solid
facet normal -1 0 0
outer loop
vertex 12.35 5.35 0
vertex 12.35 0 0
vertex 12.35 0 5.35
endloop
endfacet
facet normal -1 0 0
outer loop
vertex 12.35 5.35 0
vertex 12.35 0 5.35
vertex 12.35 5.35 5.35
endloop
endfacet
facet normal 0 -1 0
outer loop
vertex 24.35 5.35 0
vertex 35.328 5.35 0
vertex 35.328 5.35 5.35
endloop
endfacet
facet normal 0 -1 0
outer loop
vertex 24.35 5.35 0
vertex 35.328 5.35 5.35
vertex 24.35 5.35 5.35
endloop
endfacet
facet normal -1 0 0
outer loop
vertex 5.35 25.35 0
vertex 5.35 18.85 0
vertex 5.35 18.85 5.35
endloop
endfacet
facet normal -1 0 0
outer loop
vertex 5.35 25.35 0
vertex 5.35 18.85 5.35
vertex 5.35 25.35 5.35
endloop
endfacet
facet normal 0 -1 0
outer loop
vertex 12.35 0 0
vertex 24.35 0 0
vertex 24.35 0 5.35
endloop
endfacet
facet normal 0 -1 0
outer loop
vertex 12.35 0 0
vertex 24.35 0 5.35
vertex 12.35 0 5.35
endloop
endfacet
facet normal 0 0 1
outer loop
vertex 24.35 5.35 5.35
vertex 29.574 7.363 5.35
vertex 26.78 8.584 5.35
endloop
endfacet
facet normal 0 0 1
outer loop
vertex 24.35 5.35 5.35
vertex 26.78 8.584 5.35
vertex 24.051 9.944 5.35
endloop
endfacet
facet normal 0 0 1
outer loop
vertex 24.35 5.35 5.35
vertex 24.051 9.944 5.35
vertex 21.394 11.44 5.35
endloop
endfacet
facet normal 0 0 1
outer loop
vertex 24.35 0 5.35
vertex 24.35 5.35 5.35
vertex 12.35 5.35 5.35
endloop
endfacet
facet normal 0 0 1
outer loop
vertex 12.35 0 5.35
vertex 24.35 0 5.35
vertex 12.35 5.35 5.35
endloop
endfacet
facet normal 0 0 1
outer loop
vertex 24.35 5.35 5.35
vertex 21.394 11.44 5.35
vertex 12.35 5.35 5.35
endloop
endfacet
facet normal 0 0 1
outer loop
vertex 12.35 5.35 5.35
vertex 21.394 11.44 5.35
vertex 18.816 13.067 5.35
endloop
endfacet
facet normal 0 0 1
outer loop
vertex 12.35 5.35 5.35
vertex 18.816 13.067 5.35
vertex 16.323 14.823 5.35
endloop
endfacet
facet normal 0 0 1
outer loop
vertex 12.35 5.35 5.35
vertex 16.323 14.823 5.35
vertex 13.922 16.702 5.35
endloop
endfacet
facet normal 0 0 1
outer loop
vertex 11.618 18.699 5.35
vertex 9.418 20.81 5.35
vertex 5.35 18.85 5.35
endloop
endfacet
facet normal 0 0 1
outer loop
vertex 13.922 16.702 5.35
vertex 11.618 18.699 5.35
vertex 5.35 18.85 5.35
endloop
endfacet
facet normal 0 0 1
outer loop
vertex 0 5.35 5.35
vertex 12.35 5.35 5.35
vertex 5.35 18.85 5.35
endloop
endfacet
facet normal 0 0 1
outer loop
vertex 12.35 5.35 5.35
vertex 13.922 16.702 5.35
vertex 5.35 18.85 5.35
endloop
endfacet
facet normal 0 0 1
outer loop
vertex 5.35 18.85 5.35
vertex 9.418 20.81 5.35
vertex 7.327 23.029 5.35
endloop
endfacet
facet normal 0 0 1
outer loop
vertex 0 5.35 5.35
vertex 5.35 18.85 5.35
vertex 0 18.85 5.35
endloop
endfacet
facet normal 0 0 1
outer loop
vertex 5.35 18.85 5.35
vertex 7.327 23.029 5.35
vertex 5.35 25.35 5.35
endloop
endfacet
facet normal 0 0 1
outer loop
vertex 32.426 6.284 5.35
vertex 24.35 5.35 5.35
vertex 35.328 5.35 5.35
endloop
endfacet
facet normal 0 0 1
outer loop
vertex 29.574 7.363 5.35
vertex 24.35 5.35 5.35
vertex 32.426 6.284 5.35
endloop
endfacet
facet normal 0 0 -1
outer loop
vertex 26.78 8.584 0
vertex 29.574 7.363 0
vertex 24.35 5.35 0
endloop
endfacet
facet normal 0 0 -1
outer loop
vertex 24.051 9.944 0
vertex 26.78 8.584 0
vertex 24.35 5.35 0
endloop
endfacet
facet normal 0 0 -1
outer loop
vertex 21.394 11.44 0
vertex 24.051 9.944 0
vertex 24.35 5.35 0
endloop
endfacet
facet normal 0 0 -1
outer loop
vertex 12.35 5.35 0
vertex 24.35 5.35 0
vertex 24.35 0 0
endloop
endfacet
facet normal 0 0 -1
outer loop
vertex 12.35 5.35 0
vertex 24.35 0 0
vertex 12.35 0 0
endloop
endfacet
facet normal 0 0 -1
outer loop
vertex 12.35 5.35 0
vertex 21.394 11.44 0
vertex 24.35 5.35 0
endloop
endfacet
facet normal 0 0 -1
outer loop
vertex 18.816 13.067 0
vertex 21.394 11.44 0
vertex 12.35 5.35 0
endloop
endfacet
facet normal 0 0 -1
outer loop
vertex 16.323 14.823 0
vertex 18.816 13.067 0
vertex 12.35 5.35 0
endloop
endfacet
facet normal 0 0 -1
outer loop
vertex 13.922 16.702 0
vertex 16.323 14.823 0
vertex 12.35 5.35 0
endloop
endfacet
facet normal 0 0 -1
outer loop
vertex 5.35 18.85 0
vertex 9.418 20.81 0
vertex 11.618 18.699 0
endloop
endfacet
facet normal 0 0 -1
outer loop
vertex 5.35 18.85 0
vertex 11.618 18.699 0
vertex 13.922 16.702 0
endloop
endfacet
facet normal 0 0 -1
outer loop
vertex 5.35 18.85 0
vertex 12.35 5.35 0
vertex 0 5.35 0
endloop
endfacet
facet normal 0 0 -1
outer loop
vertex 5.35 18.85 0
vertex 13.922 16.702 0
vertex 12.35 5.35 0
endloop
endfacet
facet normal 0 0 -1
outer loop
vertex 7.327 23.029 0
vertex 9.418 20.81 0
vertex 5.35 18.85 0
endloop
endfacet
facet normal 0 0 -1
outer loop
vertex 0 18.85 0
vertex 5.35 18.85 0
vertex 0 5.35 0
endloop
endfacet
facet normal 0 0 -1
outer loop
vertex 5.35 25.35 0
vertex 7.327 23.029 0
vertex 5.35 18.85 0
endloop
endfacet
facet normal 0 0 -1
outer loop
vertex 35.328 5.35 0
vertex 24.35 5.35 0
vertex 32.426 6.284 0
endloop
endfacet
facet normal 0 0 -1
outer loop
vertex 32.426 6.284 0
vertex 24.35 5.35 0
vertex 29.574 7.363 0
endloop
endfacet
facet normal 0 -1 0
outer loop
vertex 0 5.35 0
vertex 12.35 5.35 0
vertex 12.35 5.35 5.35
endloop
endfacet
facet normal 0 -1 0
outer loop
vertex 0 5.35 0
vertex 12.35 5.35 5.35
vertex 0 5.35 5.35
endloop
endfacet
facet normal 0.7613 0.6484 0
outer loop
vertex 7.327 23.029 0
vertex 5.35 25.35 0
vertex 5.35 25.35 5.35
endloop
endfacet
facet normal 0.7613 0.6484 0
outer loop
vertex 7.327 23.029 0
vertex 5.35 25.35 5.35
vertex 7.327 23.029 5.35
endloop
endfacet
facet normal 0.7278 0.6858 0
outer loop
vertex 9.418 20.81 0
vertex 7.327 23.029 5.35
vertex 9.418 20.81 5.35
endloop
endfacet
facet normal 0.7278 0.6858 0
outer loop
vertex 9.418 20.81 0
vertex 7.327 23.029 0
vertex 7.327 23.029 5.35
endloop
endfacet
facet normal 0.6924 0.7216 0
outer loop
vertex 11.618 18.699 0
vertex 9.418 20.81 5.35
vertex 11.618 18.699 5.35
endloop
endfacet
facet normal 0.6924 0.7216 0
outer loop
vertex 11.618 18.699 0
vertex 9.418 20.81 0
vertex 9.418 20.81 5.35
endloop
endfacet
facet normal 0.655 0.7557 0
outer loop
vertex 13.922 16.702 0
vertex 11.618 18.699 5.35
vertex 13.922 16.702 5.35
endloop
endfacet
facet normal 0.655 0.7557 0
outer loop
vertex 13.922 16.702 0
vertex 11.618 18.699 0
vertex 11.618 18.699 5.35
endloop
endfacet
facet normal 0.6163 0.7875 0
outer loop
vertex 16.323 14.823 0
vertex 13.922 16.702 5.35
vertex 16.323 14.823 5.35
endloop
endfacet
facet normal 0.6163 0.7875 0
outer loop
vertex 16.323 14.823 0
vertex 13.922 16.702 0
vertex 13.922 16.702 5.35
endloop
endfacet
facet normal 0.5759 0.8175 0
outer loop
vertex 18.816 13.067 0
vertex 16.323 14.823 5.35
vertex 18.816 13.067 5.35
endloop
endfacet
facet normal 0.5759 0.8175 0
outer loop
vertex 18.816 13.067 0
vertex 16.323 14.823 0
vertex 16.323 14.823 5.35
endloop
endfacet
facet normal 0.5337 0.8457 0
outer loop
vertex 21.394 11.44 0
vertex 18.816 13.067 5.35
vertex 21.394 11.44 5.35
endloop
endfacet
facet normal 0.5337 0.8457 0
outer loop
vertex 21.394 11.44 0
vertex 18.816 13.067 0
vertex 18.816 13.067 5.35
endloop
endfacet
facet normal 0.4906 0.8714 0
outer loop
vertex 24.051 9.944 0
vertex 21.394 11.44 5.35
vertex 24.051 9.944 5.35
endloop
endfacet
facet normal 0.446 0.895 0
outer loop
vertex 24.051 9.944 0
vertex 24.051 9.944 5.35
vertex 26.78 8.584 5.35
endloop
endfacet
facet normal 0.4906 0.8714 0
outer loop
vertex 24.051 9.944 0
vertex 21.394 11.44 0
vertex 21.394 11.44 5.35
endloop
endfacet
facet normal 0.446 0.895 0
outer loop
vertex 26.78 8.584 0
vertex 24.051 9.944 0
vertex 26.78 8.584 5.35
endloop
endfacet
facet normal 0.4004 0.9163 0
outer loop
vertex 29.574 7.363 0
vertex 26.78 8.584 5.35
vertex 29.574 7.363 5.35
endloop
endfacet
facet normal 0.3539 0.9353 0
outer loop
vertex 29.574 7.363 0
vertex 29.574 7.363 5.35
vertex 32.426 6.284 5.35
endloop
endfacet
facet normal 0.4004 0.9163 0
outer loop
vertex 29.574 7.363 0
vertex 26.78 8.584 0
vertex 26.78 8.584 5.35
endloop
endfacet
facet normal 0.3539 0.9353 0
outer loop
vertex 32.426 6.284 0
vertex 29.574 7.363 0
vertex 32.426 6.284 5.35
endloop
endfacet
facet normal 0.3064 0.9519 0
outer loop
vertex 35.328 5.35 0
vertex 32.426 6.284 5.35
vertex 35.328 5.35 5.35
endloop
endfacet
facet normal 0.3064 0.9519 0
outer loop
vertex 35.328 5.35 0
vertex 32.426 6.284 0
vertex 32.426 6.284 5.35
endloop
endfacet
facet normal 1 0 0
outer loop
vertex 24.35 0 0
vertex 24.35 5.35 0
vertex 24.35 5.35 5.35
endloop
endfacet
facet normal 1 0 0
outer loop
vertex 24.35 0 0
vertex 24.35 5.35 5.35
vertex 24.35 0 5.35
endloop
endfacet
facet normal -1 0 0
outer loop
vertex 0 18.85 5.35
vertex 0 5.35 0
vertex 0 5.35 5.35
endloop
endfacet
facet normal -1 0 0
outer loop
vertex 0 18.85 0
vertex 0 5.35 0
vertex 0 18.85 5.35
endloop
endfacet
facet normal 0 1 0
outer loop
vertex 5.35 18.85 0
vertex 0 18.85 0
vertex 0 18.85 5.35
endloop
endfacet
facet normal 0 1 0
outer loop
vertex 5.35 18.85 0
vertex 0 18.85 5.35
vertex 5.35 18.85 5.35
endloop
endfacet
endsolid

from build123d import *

# Parameters (mm, degrees)
BOSS_EXTRUDE1_DEPTH = 5.35


with BuildPart() as part:
    # Model → Boss-Extrude1 (new body)
    with BuildSketch(Plane.XY):
        with BuildLine():
            Line((5.349999992, 18.850000109), (5.349999992, 25.350000244))
            ThreePointArc((5.349999992, 25.350000244), (18.816228513, 13.067475271), (35.328051774, 5.350000109))
            Line((35.328051774, 5.350000109), (24.349999381, 5.350000109))
            Line((24.349999381, 5.350000109), (24.349999381, 0))
            Line((24.349999381, 0), (12.350000208, 0))
            Line((12.350000208, 0), (12.350000208, 5.350000109))
            Line((12.350000208, 5.350000109), (0, 5.350000109))
            Line((0, 5.350000109), (0, 18.850000109))
            Line((0, 18.850000109), (5.349999992, 18.850000109))
        make_face()
    extrude(amount=BOSS_EXTRUDE1_DEPTH)


solid = part.part
